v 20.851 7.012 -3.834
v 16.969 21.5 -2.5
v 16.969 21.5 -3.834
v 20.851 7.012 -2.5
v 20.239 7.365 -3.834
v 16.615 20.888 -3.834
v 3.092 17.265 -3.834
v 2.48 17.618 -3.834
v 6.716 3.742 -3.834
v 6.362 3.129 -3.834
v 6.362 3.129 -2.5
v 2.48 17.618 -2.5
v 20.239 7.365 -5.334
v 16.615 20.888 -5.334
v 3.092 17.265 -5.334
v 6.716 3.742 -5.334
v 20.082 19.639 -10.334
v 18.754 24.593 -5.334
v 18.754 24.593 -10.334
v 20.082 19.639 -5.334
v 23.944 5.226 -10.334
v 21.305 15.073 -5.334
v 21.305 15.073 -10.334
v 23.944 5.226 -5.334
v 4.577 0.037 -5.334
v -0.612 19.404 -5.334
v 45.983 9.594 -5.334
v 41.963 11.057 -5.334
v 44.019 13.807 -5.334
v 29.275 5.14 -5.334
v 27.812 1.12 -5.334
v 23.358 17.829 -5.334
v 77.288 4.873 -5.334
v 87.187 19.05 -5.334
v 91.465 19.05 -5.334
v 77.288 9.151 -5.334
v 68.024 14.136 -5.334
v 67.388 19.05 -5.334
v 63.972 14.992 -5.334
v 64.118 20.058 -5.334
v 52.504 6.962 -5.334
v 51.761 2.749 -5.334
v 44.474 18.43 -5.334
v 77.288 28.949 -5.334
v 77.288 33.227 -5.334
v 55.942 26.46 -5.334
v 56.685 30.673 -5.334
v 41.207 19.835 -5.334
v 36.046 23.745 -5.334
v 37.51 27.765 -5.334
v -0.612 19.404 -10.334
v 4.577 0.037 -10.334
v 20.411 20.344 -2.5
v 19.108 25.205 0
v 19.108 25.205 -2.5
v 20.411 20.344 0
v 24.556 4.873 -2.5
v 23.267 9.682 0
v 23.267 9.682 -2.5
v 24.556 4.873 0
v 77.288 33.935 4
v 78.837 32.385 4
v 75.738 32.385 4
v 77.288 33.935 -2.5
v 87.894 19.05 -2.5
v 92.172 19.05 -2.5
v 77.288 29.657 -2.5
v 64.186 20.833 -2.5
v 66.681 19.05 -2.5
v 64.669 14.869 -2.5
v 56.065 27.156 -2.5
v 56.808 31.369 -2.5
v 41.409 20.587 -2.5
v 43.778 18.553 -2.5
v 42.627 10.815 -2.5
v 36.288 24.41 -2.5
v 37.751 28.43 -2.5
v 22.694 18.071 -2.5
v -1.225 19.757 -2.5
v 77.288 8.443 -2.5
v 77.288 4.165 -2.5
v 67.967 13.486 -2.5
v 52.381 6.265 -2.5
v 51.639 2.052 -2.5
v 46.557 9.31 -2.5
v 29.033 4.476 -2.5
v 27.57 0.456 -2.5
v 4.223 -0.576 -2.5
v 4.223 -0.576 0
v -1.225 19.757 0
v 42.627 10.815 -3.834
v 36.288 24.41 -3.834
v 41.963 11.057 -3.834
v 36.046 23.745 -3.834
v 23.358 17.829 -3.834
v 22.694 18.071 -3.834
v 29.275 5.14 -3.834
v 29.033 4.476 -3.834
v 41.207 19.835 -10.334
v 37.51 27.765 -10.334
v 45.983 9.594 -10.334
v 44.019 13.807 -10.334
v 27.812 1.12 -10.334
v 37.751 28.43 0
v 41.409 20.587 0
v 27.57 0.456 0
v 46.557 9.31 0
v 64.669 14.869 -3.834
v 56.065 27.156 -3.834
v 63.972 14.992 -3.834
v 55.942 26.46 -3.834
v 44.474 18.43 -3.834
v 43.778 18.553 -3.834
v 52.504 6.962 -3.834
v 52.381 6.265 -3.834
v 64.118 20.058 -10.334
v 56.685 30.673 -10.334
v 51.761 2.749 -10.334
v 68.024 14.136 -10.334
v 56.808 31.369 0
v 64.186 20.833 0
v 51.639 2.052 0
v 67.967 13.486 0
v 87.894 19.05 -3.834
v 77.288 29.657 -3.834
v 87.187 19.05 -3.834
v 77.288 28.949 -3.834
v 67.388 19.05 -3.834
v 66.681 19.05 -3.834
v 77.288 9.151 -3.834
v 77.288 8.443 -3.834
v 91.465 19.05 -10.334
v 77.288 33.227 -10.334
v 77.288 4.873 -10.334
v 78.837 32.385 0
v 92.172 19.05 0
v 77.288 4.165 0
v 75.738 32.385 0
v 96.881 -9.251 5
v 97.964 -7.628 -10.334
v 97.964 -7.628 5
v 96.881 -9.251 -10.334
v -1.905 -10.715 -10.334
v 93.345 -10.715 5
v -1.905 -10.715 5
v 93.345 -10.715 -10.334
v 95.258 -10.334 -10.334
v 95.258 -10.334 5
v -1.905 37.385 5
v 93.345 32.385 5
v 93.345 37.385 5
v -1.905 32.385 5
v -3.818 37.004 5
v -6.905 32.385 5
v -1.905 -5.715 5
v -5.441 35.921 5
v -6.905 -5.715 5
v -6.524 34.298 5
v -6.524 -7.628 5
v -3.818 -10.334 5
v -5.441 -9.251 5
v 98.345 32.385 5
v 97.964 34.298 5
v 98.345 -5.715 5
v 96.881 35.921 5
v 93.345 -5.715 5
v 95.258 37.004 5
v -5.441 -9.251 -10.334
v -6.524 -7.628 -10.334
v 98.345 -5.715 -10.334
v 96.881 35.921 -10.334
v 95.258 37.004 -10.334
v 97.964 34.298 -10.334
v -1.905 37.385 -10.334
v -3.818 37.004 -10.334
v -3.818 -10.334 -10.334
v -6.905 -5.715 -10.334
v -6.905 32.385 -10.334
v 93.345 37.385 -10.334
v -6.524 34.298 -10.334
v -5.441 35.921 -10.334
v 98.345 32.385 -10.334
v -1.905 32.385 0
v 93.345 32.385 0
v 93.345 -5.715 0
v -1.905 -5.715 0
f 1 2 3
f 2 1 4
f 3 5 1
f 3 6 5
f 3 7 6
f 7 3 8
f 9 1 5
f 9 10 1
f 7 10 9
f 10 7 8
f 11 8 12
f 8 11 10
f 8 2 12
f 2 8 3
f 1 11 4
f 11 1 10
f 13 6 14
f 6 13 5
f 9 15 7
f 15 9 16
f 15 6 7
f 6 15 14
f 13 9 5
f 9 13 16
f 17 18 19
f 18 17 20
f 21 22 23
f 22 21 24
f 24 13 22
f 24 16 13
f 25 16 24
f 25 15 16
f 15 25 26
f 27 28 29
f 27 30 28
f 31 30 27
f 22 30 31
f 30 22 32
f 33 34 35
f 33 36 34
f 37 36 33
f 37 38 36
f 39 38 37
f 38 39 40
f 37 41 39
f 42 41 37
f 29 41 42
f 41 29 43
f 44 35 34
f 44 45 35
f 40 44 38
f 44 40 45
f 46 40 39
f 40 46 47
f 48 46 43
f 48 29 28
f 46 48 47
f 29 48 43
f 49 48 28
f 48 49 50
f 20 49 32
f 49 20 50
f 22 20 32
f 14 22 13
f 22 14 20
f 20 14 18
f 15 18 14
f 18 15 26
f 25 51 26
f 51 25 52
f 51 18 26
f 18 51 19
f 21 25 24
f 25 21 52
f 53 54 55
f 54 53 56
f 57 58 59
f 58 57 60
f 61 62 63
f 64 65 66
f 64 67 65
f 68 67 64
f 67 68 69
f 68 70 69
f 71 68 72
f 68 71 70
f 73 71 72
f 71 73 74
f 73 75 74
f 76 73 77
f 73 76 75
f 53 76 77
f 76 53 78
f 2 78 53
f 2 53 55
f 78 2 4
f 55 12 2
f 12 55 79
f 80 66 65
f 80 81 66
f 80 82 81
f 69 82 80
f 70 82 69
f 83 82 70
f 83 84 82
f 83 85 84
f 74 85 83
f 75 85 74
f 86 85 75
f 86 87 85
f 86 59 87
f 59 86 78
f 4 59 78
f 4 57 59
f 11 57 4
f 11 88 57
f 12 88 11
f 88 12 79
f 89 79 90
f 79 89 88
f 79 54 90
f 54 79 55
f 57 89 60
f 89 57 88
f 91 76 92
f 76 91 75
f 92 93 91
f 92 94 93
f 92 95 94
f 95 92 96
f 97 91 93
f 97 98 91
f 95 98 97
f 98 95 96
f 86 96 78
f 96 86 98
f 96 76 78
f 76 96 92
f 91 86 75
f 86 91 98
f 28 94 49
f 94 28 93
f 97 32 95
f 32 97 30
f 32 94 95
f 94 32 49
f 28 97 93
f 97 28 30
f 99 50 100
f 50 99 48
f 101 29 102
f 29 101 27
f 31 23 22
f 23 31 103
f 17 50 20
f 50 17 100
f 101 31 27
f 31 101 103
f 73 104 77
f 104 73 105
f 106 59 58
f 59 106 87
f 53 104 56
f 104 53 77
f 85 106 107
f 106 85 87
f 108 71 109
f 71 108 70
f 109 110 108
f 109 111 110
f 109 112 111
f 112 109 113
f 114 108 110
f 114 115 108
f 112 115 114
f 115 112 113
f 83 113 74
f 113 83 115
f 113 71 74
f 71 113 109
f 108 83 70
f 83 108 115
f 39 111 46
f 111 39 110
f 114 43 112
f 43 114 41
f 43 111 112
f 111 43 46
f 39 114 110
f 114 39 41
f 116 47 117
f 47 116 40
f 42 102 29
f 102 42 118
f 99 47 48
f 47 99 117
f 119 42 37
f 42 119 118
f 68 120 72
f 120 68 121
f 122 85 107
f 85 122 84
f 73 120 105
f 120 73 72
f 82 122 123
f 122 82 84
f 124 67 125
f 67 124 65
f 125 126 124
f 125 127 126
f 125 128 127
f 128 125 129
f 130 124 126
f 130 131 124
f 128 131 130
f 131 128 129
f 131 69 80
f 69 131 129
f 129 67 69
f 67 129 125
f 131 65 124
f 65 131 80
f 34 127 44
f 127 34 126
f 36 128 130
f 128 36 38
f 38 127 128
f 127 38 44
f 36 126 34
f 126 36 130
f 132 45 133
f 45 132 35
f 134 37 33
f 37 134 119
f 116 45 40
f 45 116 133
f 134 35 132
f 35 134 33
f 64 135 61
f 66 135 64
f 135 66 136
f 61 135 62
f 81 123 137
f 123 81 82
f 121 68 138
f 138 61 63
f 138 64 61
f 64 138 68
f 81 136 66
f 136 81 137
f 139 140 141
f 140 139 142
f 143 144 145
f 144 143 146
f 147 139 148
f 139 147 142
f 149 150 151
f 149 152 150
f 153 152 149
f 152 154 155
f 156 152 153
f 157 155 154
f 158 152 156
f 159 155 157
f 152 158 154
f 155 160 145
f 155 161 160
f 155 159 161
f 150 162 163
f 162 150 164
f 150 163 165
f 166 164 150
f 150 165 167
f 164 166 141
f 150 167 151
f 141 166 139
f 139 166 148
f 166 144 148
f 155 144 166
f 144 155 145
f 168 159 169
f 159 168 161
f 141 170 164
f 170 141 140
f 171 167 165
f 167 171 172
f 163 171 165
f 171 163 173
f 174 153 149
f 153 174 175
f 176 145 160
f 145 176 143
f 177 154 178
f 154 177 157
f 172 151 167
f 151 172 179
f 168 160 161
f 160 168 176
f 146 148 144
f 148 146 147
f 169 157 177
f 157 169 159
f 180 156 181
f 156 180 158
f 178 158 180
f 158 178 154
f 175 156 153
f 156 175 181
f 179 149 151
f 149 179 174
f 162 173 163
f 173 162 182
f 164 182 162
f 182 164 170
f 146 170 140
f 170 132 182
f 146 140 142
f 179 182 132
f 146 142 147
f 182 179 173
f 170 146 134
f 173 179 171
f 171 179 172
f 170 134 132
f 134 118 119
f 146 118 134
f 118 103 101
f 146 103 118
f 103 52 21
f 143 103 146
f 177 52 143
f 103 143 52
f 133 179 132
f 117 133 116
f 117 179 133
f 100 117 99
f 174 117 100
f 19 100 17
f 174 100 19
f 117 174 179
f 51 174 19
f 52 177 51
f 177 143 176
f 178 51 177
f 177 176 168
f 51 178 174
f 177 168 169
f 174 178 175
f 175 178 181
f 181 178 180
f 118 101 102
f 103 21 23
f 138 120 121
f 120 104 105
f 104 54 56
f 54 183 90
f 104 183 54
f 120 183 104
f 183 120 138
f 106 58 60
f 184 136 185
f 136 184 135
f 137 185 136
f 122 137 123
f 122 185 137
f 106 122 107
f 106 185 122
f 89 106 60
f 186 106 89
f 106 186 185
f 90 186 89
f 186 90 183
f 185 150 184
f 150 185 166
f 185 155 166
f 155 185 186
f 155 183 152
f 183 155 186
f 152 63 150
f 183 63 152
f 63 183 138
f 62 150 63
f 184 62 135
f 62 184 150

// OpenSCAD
// file: ../lib/circuits/helpers.scad
function bu(u) = u * 2.54;

module breadboard_row(number, orientation="vertical") {
  children();
  if(number > 1) {
    if(orientation == "vertical") {
      translate([0,bu(1),0])
        breadboard_row(number-1, orientation=orientation) {
          children();
        }
    } else {
      translate([bu(1),0,0])
        breadboard_row(number-1, orientation=orientation){
          children();
        }
    }
  }
}
// file: ../lib/switches/rgb.scad
include <../variables.scad>

module rgb_row_trace_connection(width, height, xpos, ypos, rgb, connections) {
  half_width = u_mm(width)/2;
  half_height = u_mm(height)/2;
  if(connections[3] == "connect") {
    translate([1-half_width,8.875,0]){
      circle(d=0.8,$fn=40);
      offset(0.4)
        polygon(points=[[0,-0.01],[0,0.01],[u_mm(-xpos)-2, u_mm(-ypos)+0.01],[u_mm(-xpos)-2, u_mm(-ypos)-0.01]]);
    }
    translate([1-half_width,4.9,0]){
      circle(d=0.8,$fn=40);
      offset(0.4)
        polygon(points=[[0,-0.01],[0,0.01],[u_mm(-xpos)-2, u_mm(-ypos)+0.01],[u_mm(-xpos)-2, u_mm(-ypos)-0.01]]);
    }
    translate([1-half_width,3.3,0]){
      circle(d=0.8,$fn=40);
      offset(0.4)
        polygon(points=[[0,-0.01],[0,0.01],[u_mm(-xpos)-2, u_mm(-ypos)+0.01],[u_mm(-xpos)-2, u_mm(-ypos)-0.01]]);
    }
  }
  if(connections[2] == "connect") {
    translate([half_width-1,8.875,0]) {
      circle(d=0.8,$fn=40);
    }
    translate([half_width-1,4.9,0]) {
      circle(d=0.8,$fn=40);
    }
    translate([half_width-1,3.3,0]){
      circle(d=0.8,$fn=40);
    }
  }
}

module rgb_pcb_drill(width=1, height=1, rgb=true, connections=["hole","hole","hole","hole"]) {
  half_width = u_mm(width)/2;
  half_height = u_mm(height)/2;
  translate([half_width,half_height,0]) {
    if(rgb == true) {
      // LED Hole
      translate([-1.875,3.4])
        square([3.75,3]);

      // LED D
      if(connections[3] == "hole")
        translate([1.3-half_width,8,0])
          circle(d=1,$fn=40);
      if(connections[2] == "hole")
        translate([half_width-1.3,8,0])
          circle(d=1,$fn=40);

      // LED G
      if(connections[3] == "hole")
        translate([1.3-half_width,5.4,0])
          circle(d=1,$fn=40);
      if(connections[2] == "hole")
        translate([half_width-1.3,5.4,0])
          circle(d=1,$fn=40);

      // LED V
      if(connections[3] == "hole")
        translate([1.3-half_width,2.8,0])
          circle(d=1,$fn=40);
      if(connections[2] == "hole")
        translate([half_width-1.3,2.8,0])
          circle(d=1,$fn=40);
    }

    children();
  }
}

module rgb_pcb_hole_traces(width=1, height=1, rgb=true, xpos=0, ypos=0, connections=["hole","hole","hole","hole"]) {
  half_width = u_mm(width)/2;
  half_height = u_mm(height)/2;
  translate([half_width,half_height,0]) {
    if(rgb == true) {
      // LED D
      if(connections[3] == "hole")
        translate([1.3-half_width,8,0])
          circle(d=2.5,$fn=40);
      if(connections[2] == "hole")
        translate([half_width-1.3,8,0])
          circle(d=2.5,$fn=40);

      // LED G
      if(connections[3] == "hole")
        translate([1.3-half_width,5.4,0])
          circle(d=2.5,$fn=40);
      if(connections[2] == "hole")
        translate([half_width-1.3,5.4,0])
          circle(d=2.5,$fn=40);

      // LED V
      if(connections[3] == "hole")
        translate([1.3-half_width,2.8,0])
          circle(d=2.5,$fn=40);
      if(connections[2] == "hole")
        translate([half_width-1.3,2.8,0])
          circle(d=2.5,$fn=40);
    }

    children();
  }
}

module rgb_pcb_traces(width=1, height=1, rgb=true, xpos=0, ypos=0, connections=["hole","hole","hole","hole"]) {
  half_width = u_mm(width)/2;
  half_height = u_mm(height)/2;
  rgb_pcb_hole_traces(width=width, height=height, rgb=rgb, connections=connections) {
    if(rgb == true) {
      rgb_row_trace_connection(width=width, height=height, xpos=xpos, ypos=ypos, rgb=rgb, connections=connections);
      v_left = connections[3] == "none" ? 1 : half_width-5;
      // LED G
      translate([1.25,5])
        square([2,2]);
      translate([2.7,8.5,0]) {
        length = connections[2] == "none" ? 2 : half_width-3.7; 
        square([length,0.75]);
      }
      translate([2.7,6.8])
        square([0.8,2.4]);
      translate([-3.5,6.2])
        square([7,0.8]);
      translate([-3.5,6.8])
        square([0.8,2.4]);
      translate([-4-v_left,8.5,0])
        square([v_left+1,0.75]);

      // LED D
      translate([-4-v_left,4.5,0])
        square([v_left,0.8]);
      translate([-4.5,4.5,0])
        square([0.8,1.3]);
      translate([-4.5,5,0])
        square([1.3,0.8]);
      translate([2,4,0])
        square([2,0.8]);
      translate([4,4,0])
        square([0.8,1.3]);
      translate([4,4.5,0]) {
        length = connections[2] == "none" ? 0 : half_width-5; 
        square([length,0.75]);
      }
      translate([-3.375,5])
        square([2,1.1]);
      translate([1.25,3.75])
        square([2,1.1]);

      // LED V
      v_right = connections[2] == "none" ? 0 : half_width-5.25;
      translate([-4-v_left,2.9,0])
        square([v_right+v_left+8.875,0.8]);
      translate([-3.375,3.5])
        square([2,1.35]);
    }

    children();
  }
}
// file: ../lib/switches/base.scad
include <../variables.scad>
include <rgb.scad>

// ["top", "bottom", "left", "right"]

module switch_row_trace_connection(width, height, xpos, ypos, rgb, connections) {
  half_width = u_mm(width)/2;
  half_height = u_mm(height)/2;
  if(connections[3] == "connect") {
    translate([1-half_width,-5.5,0]){
      circle(d=0.8,$fn=40);
      offset(0.4)
        polygon(points=[[0,-0.01],[0,0.01],[u_mm(-xpos)-2, u_mm(-ypos)+0.01],[u_mm(-xpos)-2, u_mm(-ypos)-0.01]]);
    }
  }
  if(connections[2] == "connect") {
    translate([half_width-1,-5.5,0]) {
      circle(d=0.8,$fn=40);
    }
  }
}

module switch_column_trace_connection(width, height, xpos, ypos, rgb, connections, last_xpos=0, last_ypos=0) {
  half_width = u_mm(width)/2;
  half_height = u_mm(height)/2;
  if(connections[1] == "connect") {
    translate([-u_mm((width-1)/2)-0.9,half_height-1,0]) {
      circle(d=0.8,$fn=40);
      offset(0.4)
        polygon(points=[[0,-0.01],[0,0.01],[u_mm((width-1)/2),0.01],[u_mm((width-1)/2),-0.01]]);
    }
  }
  if(connections[0] == "connect") {
    y_off = u_mm(ypos-last_ypos);
    x_off = u_mm(last_xpos-xpos);
    translate([-0.875,-1-y_off-half_height,0]) {
      offset(0.4)
        polygon(points=[[-0.01+x_off,0],[0.01+x_off,0],[0.01,2+y_off],[-0.01,2+y_off]]);
      translate([x_off-0.01,0]) {
        offset(0.4)
          polygon(points=[[0,-0.01],[0,0.01],[u_mm((width-1)/2)+1,0.01],[u_mm((width-1)/2)+1,-0.01]]);
      }
    }
  }
}

module switch_base_pcb_drill(width=1, height=1, rgb=true, single=true, connections=["hole","hole","hole","hole"]) {
  half_width = u_mm(width)/2;
  half_height = u_mm(height)/2;
  rgb_pcb_drill(width=width, height=height, rgb=rgb, connections=connections) {
    // Row
    if(connections[2] == "hole")
      translate([half_width-1.3,-5.5,0])
        circle(d=1,$fn=40);
    if(connections[3] == "hole")
      translate([1.3-half_width,-5.5,0])
        circle(d=1,$fn=40);

    // Column
    if(connections[1] == "hole")
      translate([-1,half_height-1.25,0])
        circle(d=1,$fn=40);
    if(connections[0] == "hole")
      translate([-1,1.25-half_height,0])
        circle(d=1,$fn=40);

    children();
  }
}

module switch_base_pcb_traces(width=1, height=1, rgb=true, xpos=0, ypos=0, connections=["hole","hole","hole","hole"], last_xpos=0, last_ypos=0, single=true) {
  half_width = u_mm(width)/2;
  half_height = u_mm(height)/2;
  rgb_pcb_traces(width=width, height=height, rgb=rgb, xpos=xpos, ypos=ypos, connections=connections) {
    switch_row_trace_connection(width, height, xpos, ypos, rgb, connections);
    if(single && !rgb)
      switch_column_trace_connection(width, height, xpos, ypos, rgb, connections, last_xpos=last_xpos, last_ypos=last_ypos);

    // Row
    if(connections[2] == "hole")
      translate([half_width-1.3,-5.5,0])
        circle(d=2.5,$fn=40);
    if(connections[3] == "hole")
      translate([1.3-half_width,-5.5,0])
        circle(d=2.5,$fn=40);

    // Column
    if(connections[1] == "hole")
      translate([-1,half_height-1.25,0])
        circle(d=2.4,$fn=40);
    if(connections[0] == "hole")
      translate([-1,1.25-half_height,0])
        circle(d=2.4,$fn=40);

    children();
  }
}

module switch_base_pcb_traces_bottom(width=1, height=1, rgb=true, xpos=0, ypos=0, connections=["hole","hole","hole","hole"], last_xpos=0, last_ypos=0) {
  half_width = u_mm(width)/2;
  half_height = u_mm(height)/2;
  rgb_pcb_hole_traces(width=width, height=height, rgb=rgb, connections=connections) {
    switch_column_trace_connection(width, height, xpos, ypos, rgb, connections, last_xpos=last_xpos, last_ypos=last_ypos);

    // Row
    if(connections[2] == "hole")
      translate([half_width-1.3,-5.5,0])
        circle(d=2.5,$fn=40);
    if(connections[3] == "hole")
      translate([1.3-half_width,-5.5,0])
        circle(d=2.5,$fn=40);

    // Column
    if(connections[1] == "hole")
      translate([-1,half_height-1.25,0])
        circle(d=2.5,$fn=40);
    if(connections[0] == "hole")
      translate([-1,1.25-half_height,0])
        circle(d=2.5,$fn=40);

    children();
  }
}
// file: ../lib/switches/footprints.scad
include <../variables.scad>
include <stabilizers.scad>

module pcb_switch_outline(width=1, height=1) {
  stab_extra = width >= 2 ? 2 : 0;
  translate([0,-stab_extra])
    square([u_mm(width)+0.01, u_mm(height)+0.01+stab_extra]);
}

module pcb_switch_space_outline(width=1, height=1, style="mx", cnc=false) {
  offset = height_for_style(style);
  stab_extra = width >= 2 ? 2 : 0;
  translate([-1,-1-stab_extra,2.834-offset])
    cube([u_mm(width) + 2, u_mm(height) + 2 + stab_extra, 1.166+offset]);
  translate([u_mm(width/2),u_mm(height/2)]) {
    translate([-7.5,-7.5,1.5-offset])
      cube([15,15,5]);
    translate([-7,-7,-10])
      cube([14,14,10]);
    translate([u_mm(-width/2)-0.5,u_mm(-height/2)-0.5,-20-offset])
      cube([u_mm(width)+1,u_mm(height)+1, 20]);
  }
  translate([hole_offset(width), hole_offset(height),-10])
    stab(width);
}
// file: ../lib/switches/stabilizers.scad
module stab_hole_render(distance){
  translate([14+distance+3.375,6.99,0]) {
    circle(d=3.175, $fn=40);
    translate([0,-15.24,0])
      circle(d=4.064, $fn=40);
  }
  translate([-6.75-distance+3.375,6.99,0]) {
    circle(d=3.175, $fn=40);
    translate([0,-15.24,0])
      circle(d=4.064, $fn=40);
  }
}

module stab_holes(width) {
  if (width >= 7) {
    stab_hole_render(39.6);
  } else if (width >= 6) {
    stab_hole_render(39.6);
  } else if(width >= 2) {
    stab_hole_render(1.6);
  }
}

module stab_render(distance, cnc=false, height=5.334) {
  translate([14+distance,1.47,0]){
    // Right Side Large Hole
    cube([6.75,12.3,10]);

    // Add 1/16" corner holes for milling
    if(cnc){
      translate([0.56,0.56,0])
        cylinder(h=10,d=1.59,$fn=20);
      translate([6.75-0.56,0.56,0])
        cylinder(h=10,d=1.59,$fn=20);
      translate([0.56,12.3-0.56,0])
        cylinder(h=10,d=1.59,$fn=20);
      translate([6.75-0.56,12.3-0.56,0])
        cylinder(h=10,d=1.59,$fn=20);
    }
    translate([5.75,3.23,0]){
      // Side hole for notch
      cube([1.825,3.175,10]);
      translate([1.825,1.59,0])
        if(cnc)
          resize([1.59,3.175,10])
            cylinder(h=10,d=1.59,$fn=20);
    }
    translate([1.725,11.3,0]){
      // Top Notch
      cube([3.3,2.2,10]);
      if(cnc)
        translate([1.65,2.2,0])
          resize([3.3,1,10])
            cylinder(h=10,d=1,$fn=20);
    }
    // Thin out for clip
    translate([-1,-1,10-height+1.5])
      cube([8.75,14.3,height-1.5]);
  }
  translate([-6.75-distance,1.47,0]){
    // Left Side Large Hole
    cube([6.75,12.3,10]);
    translate([-0.825,3.23,0]){
      // Side hole for notch
      cube([1.825,3.175,10]);
      if(cnc)
        translate([0,1.59,0])
          resize([1.59,3.175,10])
            cylinder(h=10,d=1.59,$fn=20);

    }
    translate([1.725,11.3,0]){
      // Top Notch
      cube([3.3,2.2,10]);
      if(cnc)
        translate([1.65,2.2,0])
          resize([3.3,1,10])
            cylinder(h=10,d=1,$fn=20);
    }
    if(cnc){
      translate([0.56,0.56,0])
        cylinder(h=10,d=1.59,$fn=20);
      translate([6.75-0.56,0.56,0])
        cylinder(h=10,d=1.59,$fn=20);
      translate([0.56,12.3-0.56,0])
        cylinder(h=10,d=1.59,$fn=20);
      translate([6.75-0.56,12.3-0.56,0])
        cylinder(h=10,d=1.59,$fn=20);
    }
    // Thin out for clip
    translate([-1,-1,10-height+1.5])
      cube([8.75,14.3,height-1.5]);
  }
  // Center shaft for bar
  translate([-distance-2,4.7,0]){
    cube([distance*2+20,4.6,10]);
  }
}

module stab(key_width, cnc=false) {
  if (key_width >= 7) {
    stab_render(39.6, cnc=cnc);
  } else if (key_width >= 6) {
    stab_render(39.6, cnc=cnc);
  } else if(key_width >= 2) {
    stab_render(1.6, cnc=cnc);
  }
}
// file: ../lib/circuits/wire.scad
module guage(guage=12) {
  fn=20;
  if(guage == 8) {
    circle(d=3.25, $fn=fn);
  } else if (guage == 10) {
    circle(d=2.59, $fn=fn);
  } else if (guage == 12) {
    circle(d=2.06, $fn=fn);
  } else if (guage == 14) {
    circle(d=1.57, $fn=fn);
  } else if (guage == 16) {
    circle(d=1.3, $fn=fn);
  }
}

module wire_pcb_drill(guage=12) {
  offset(0.1)
    guage(guage);
}

module wire_pcb_traces(guage=12) {
  offset(0.75)
    guage(guage);
}

module wire_pcb_outline(guage=12) {
  offset(1.5)
    guage(guage);
}

module wire_space_outline(guage=12) {
  linear_extrude(10)
    offset(0.1)
      guage(guage);
}
// file: ../lib/circuits/trrs.scad
module trrs_post(d=1.2) {
  translate([0,-d/4,0]) {
    circle(d=d, $fn=20);
    translate([-d/2,0,0]) {
      square([d,(d/2-.2)]);
    }
    translate([0,(d/2-.2),0]) {
      circle(d=d, $fn=20);
    }
  }
}

module trrs_pcb_drill(side="left") {
  translate([2.8,1.5]) {
    circle(d=2, $fn=20);
  }
  translate([2.8,8.5]) {
    circle(d=2, $fn=20);
  }
  translate([0.5,11.3,0]) {
    trrs_post();
  }
  translate([5.1,3.2,0]) {
    trrs_post();
  }
  translate([5.1,6.2,0]) {
    trrs_post();
  }
  translate([5.1,10.2,0]) {
    trrs_post();
  }
  if(side != "none"){
    offset = side == "left" ? 7.6 : -2;
    translate([offset,11.3]) {
      circle(d=1.2, $fn=20);
    }
    translate([offset,8.3]) {
      circle(d=1.2, $fn=20);
    }
    translate([offset,5.3]) {
      circle(d=1.2, $fn=20);
    }
    translate([offset,2.2]) {
      circle(d=1.2, $fn=20);
    }
  }
}

module trrs_pcb_traces(side="left") {
  translate([-1,9.7,0]){
    difference() {
      square([3,3]);
      if(side == "right") {
        translate([3,-1.8]) {
          rotate(45) {
            square(2);
          }
        }
      }
    }
  }
  translate([3.6,1.2,0]){
    difference() {
      square([3,3.5]);
      if(side == "left") {
        translate([3,2.3]) {
          rotate(45) {
            square(2);
          }
        }
      }
    }
  }
  translate([3.6,4.8,0]){
    difference() {
        square([3,3.5]);
        if(side == "left") {
          translate([3,2.3]) {
            rotate(45) {
              square(2);
            }
          }
        }
    }
  }
  translate([3.6,8.4,0]){
    difference() {
      square([3,3.2]);
      if(side == "left") {
        translate([3,1.8]) {
          rotate(45) {
            square(2);
          }
        }
      }
    }
  }
  if(side != "none"){
    translate([side == "left" ? 7.6 : -2,0,0]){
      translate([0,11.3]) {
        circle(d=3, $fn=20);
      }
      translate([0,8.3]) {
        circle(d=2.9, $fn=20);
      }
      translate([0,5.3]) {
        circle(d=3, $fn=20);
      }
      translate([0,2.2]) {
        circle(d=3, $fn=20);
      }
    }
    translate([side == "left" ? 5.6 : -2,0,0]){
      left_trace = side == "left" ? 2.5 : 7.6;
      translate([0,2.2]) {
        square([left_trace,1.5]);
      }
      translate([0,5.1]) {
        square([left_trace,1.5]);
      }
      if(side == "left") {
        translate([0,8.7]) {
          square([left_trace,0.9]);
        }
      }
      else {
        translate([0,8]) {
          square([4,1.6]);
        }
        translate([4,9]) {
          square([4,1.6]);
        }
        translate([2.8,9.4]) {
          rotate(-45) {
            square([1,1.7]);
          }
        }
      }
    }
    translate([side == "left" ? 0.5 : -2,0,0]){
      right_trace = side == "left" ? 7.1 : 2;
      translate([0,11.7]) {
        square([right_trace,1.3]);
      }
      translate([0,12]) {
        circle(1, $fn=20);
      }
      translate([right_trace,11.8]) {
        circle(1, $fn=20);
      }
    }
  }
}

module trrs_pcb_outline(side="left") {
  translate([-1,0,0]) {
    square([7.6,13.1]);
  }
  if(side != "none"){
    translate([side == "left" ? 5.6 : -3.5, 0]) {
      square([4,13.1]);
    }
  }
}

module trrs_space_outline(side="left") {
  translate([0,0,-5.3]) {
    linear_extrude(7){
      translate([-2,-1,0])
        square([9.6,15.1]);
      translate([0,-12.1,0])
        square([5.6,12.1]);
      if(side != "none")
        translate([side == "left" ? 5.6 : -4.5, -1])
          square([5,15.1]);
    }
  }
  translate([3,-2,-2.6]) {
    rotate([90,0,0]) {
      cylinder(d=10, h=30, $fn=100);
    }
  }
}
// file: ../lib/circuits/trace.scad
function vdef(vector, index) = len(vector) == index ? vector[index-1] : vector[index];
function vadd(vector, index, axis) = vdef(vector, index)[axis] > vdef(vector, index-1)[axis] ? 0.01 : -0.01;
function polygon_from_vector(vector) = 
  len(vector) > 0 ?
    concat(vector, 
      [for (i = [1:len(vector)]) 
        [vector[len(vector)-i][0]-vadd(vector, i, 0),vector[len(vector)-i][1]-vadd(vector, i, 1)]])
      : [];

function parse_loc(loc) = [
  loc[5],
  len(loc) < 7 ? "both" : loc[6],
  len(loc) < 8 ? "none" : loc[7],
];

module manual_trace_pcb_drill(location) {
  vector = parse_loc(location)[0];
  echo("holes", parse_loc(location)[2]);
  if(parse_loc(location)[2] == "holes" || parse_loc(location)[2] == "hole_begin") {
    translate(vector[0]) {
      circle(d=1, $fn=20);
    }
  }
  if(parse_loc(location)[2] == "holes" || parse_loc(location)[2] == "hole_end") {
    translate(vector[len(vector)-1]) {
      circle(d=1, $fn=20);
    }
  }
}

module manual_trace_pcb_traces(location) {
  vector = parse_loc(location)[0];
  if(parse_loc(location)[1] != "bottom") {
    offset(0.4) {
      polygon(points=polygon_from_vector(vector));
    }
  }
  if(parse_loc(location)[2] == "holes" || parse_loc(location)[2] == "hole_begin") {
    translate(vector[0]) {
      circle(d=2.5, $fn=20);
    }
  }
  if(parse_loc(location)[2] == "holes" || parse_loc(location)[2] == "hole_end") {
    translate(vector[len(vector)-1]) {
      circle(d=2.5, $fn=20);
    }
  }
}

module manual_trace_pcb_traces_bottom(location) {
  vector = parse_loc(location)[0];
  if(parse_loc(location)[1] != "top") {
    offset(0.4) {
      polygon(points=polygon_from_vector(vector));
    }
  }
  if(parse_loc(location)[2] == "holes" || parse_loc(location)[2] == "hole_begin") {
    translate(vector[0]) {
      circle(d=2.5, $fn=20);
    }
  }
  if(parse_loc(location)[2] == "holes" || parse_loc(location)[2] == "hole_end") {
    translate(vector[len(vector)-1]) {
      circle(d=2.5, $fn=20);
    }
  }
}

module manual_trace_pcb_outline(location) {
  vector = parse_loc(location)[0];
  echo("location", location);
  offset(1)
    polygon(points=polygon_from_vector(vector));

  if(parse_loc(location)[2] == "holes" || parse_loc(location)[2] == "hole_begin") {
    translate(vector[0]) {
      circle(d=4, $fn=20);
    }
  }
  if(parse_loc(location)[2] == "holes" || parse_loc(location)[2] == "hole_end") {
    translate(vector[len(vector)-1]) {
      circle(d=4, $fn=20);
    }
  }
}

module manual_trace_space_outline(location) {
  vector = parse_loc(location)[0];
  translate([0,0,-1])
    linear_extrude(2)
      offset(0.5)
        manual_trace_pcb_outline(vector);
}
// file: ../lib/circuits/support.scad
module support_pcb_drill(mm=2) {
  offset(0.1)
    circle(d=mm, $fn=20);
}

module support_pcb_traces(mm=2) {
}

module support_pcb_outline(mm=2) {
  offset(2)
    circle(d=mm, $fn=20);
}

module support_space_outline(mm=2) {
  linear_extrude(10)
    offset(0.1)
      circle(d=mm, $fn=20);
}
// file: ../lib/circuits/proton_c.scad
use <helpers.scad>

module proton_c_pcb_drill(size="full") {
  translate([bu(0.5),bu(1.5),0]) {
    translate([0,bu(1)])
      breadboard_row(4, "horizontal"){
        circle(d=1, $fn=20);
        translate([0,bu(1)])
          circle(d=1, $fn=20);
      }
    translate([bu(4),bu(1)])
      breadboard_row(2)
        circle(d=1, $fn=20);
    translate([bu(4),bu(3)])
      breadboard_row(2)
        circle(d=1, $fn=20);
    circle(d=1, $fn=20);
    translate([bu(1),0,0])
      circle(d=1, $fn=20);
    translate([bu(5),0,0])
      circle(d=1, $fn=20);
    translate([bu(6),0,0])
      circle(d=1, $fn=20);
    breadboard_row(12) {
      circle(d=1, $fn=20);
      translate([bu(1),0,0])
        circle(d=1, $fn=20);
      translate([bu(5),0,0])
        circle(d=1, $fn=20);
      translate([bu(6),0,0])
        circle(d=1, $fn=20);
    }
    if(size == "full")
      translate([0,bu(13)])
        breadboard_row(6) {
          circle(d=1, $fn=20);
          translate([bu(1),0,0])
            circle(d=1, $fn=20);
          translate([bu(5),0,0])
            circle(d=1, $fn=20);
          translate([bu(6),0,0])
            circle(d=1, $fn=20);
    }
  }
}

module proton_c_pcb_traces(size="full") {
  translate([bu(0.5),bu(1.5),0]) {
    translate([0,bu(1)])
      breadboard_row(4, "horizontal"){
        circle(d=2.4, $fn=20);
        translate([-1,0])
          square([2,bu(1)]);
        translate([0,bu(1)])
          circle(d=2.4, $fn=20);
      }
    translate([0,bu(1)])
      breadboard_row(2) {
        translate([bu(5),0])
          circle(d=2.4, $fn=20);
        translate([bu(5),-1,0])
          square([bu(1),2]);
        translate([bu(6),0,0])
          circle(d=2.4, $fn=20);
      }
    translate([bu(4),bu(1)]){
      translate([-0.75,-1])
        square([1.5,bu(2)-2]);
      breadboard_row(2)
        circle(d=2.4, $fn=20);
      translate([0,-0.75])
        square([bu(2),1.5]);
    }
    translate([bu(4),bu(3)]){
      translate([-0.75,-1])
        square([1.5,bu(2)-2]);
      breadboard_row(2)
        circle(d=2.4, $fn=20);
      translate([0,-0.75])
        square([bu(2),1.5]);
    }
    circle(d=2.4, $fn=20);
    translate([0,-1,0])
      square([bu(1),2]);
    translate([bu(1),0,0])
      circle(d=2.4, $fn=20);
    translate([bu(5),0])
      circle(d=2.4, $fn=20);
    translate([bu(5),-1,0])
      square([bu(1),2]);
    translate([bu(6),0,0])
      circle(d=2.4, $fn=20);
    translate([0,bu(3)])
      breadboard_row(9) {
        circle(d=2.4, $fn=20);
        translate([0,-1,0])
          square([bu(1),2]);
        translate([bu(1),0,0])
          circle(d=2.4, $fn=20);
        translate([bu(5),0])
          circle(d=2.4, $fn=20);
        translate([bu(5),-1,0])
          square([bu(1),2]);
        translate([bu(6),0,0])
          circle(d=2.4, $fn=20);
      }
    if(size == "full")
      translate([0,bu(13)])
        breadboard_row(6) {
          circle(d=2.4, $fn=20);
          translate([0,-1,0])
            square([bu(1),2]);
          translate([bu(1),0,0])
            circle(d=2.4, $fn=20);
          translate([bu(5),0])
            circle(d=2.4, $fn=20);
          translate([bu(5),-1,0])
            square([bu(1),2]);
          translate([bu(6),0,0])
            circle(d=2.4, $fn=20);
        }
  }
}

module proton_c_pcb_outline(size="full") {
  translate([0,bu(1)])
  square([bu(7), bu(size == "full" ? 19 : 12)]);
}

module proton_c_space_outline(size="full") {
  translate([0,0,-4]) {
    linear_extrude(6) {
      translate([-bu(0.5),-bu(0.5)])
        square([bu(8), bu(size == "full" ? 21 : 14)]);
    }
    linear_extrude(5) {
      translate([bu(0.5),-bu(15),0])
        square([bu(6),bu(25)]);
    }
  }
}
// file: ../lib/circuits/pro_micro.scad
use <helpers.scad>

module pro_micro_pcb_drill(connections="holes") {
  translate([bu(0.5),bu(1.5),0]) {
    if(connections == "holes"){
      translate([bu(3),bu(1)])
        breadboard_row(3)
          circle(d=1, $fn=20);
      translate([bu(4),bu(3)])
        breadboard_row(3)
          circle(d=1, $fn=20);
    }
    breadboard_row(12) {
      circle(d=1, $fn=20);
      if(connections == "holes") {
        translate([bu(1),0,0])
          circle(d=1, $fn=20);
        translate([bu(5),0,0])
          circle(d=1, $fn=20);
      }
      translate([bu(6),0,0])
        circle(d=1, $fn=20);
    }
  }
}

module pro_micro_pcb_traces(connections="holes") {
  translate([bu(0.5),bu(1.5),0]) {
    // GRND
    if(connections == "holes"){
      translate([bu(3),bu(1)]){
        translate([-0.75,-1])
          square([1.5,bu(3)-2]);
        breadboard_row(3)
          circle(d=2.4, $fn=20);
        translate([0,-0.75])
          square([bu(2),1.5]);
      }
      translate([bu(4),bu(3)]){
        translate([-0.75,-1])
          square([1.5,bu(3)-2]);
        breadboard_row(3)
          circle(d=2.4, $fn=20);
        translate([0,-0.75])
          square([bu(2),1.5]);
      }
    }
    breadboard_row(12) {
      circle(d=2.4, $fn=20);
      if(connections == "holes") {
        translate([0,-1,0])
          square([bu(1),2]);
        translate([bu(1),0,0])
          circle(d=2.4, $fn=20);
        translate([bu(5),0])  
          circle(d=2.4, $fn=20);
        translate([bu(5),-1,0])
          square([bu(1),2]);
      }
      translate([bu(6),0,0])
        circle(d=2.4, $fn=20);
    }
  }
}

module pro_micro_pcb_outline() {
  translate([0,bu(1)])
  square([bu(7), bu(12)]);
}

module pro_micro_space_outline() {
  translate([0,0,-4]) {
    linear_extrude(6) {
      translate([-bu(0.5),-bu(0.5)])
        square([bu(8), bu(14)]);
    }
    linear_extrude(5) {
      translate([bu(0.5),-bu(15),0])
        square([bu(6),bu(25)]);
    }
  }
}
// file: ../lib/circuits/mts_101.scad
use <../variables.scad>
module mts_101_pcb_drill() {
  translate([0,1.25]) {
    translate([2.5,0])
      square([3,1]);
    translate([1.25,0.5])
      circle(d=1,$fn=40);
    translate([6.75,0.5])
      circle(d=1,$fn=40);

    translate([2.5,4.75])
      square([3,1]);
    translate([1.25,5.25])
      circle(d=1,$fn=40);
    translate([6.75,5.25])
      circle(d=1,$fn=40);

    translate([4,10])
      circle(d=1,$fn=40);
    translate([1.25,10])
      circle(d=1,$fn=40);
    translate([6.75,10])
      circle(d=1,$fn=40);
  }
}

module mts_101_pcb_traces() {
  translate([0,1.25]) {
    translate([2,-0.5])
      square([4,2]);
    translate([1.25,0.5])
      circle(d=2,$fn=40);
    translate([6.75,0.5])
      circle(d=2,$fn=40);

    translate([2,4.25])
      square([4,2]);
    translate([1.25,5.25])
      circle(d=2,$fn=40);
    translate([6.75,5.25])
      circle(d=2,$fn=40);

    translate([4,10])
      circle(d=2,$fn=40);
    translate([1.25,9.5])
      square([6,1]);
    translate([1.25,10])
      circle(d=2,$fn=40);
    translate([6.75,10])
      circle(d=2,$fn=40);
  }
}

module mts_101_pcb_outline() {
  square([8,13]);
}

module mts_101_space_outline(, cnc=false) {
  translate([-0.5,-0.5,-10])
    cube([9,14, 14.4]);
  translate([4,6.5,-26]) {
    cylinder(d=6, h=18, $fn=30);
    cylinder(d=12, h=10, $fn=60);
  }
}
// file: ../lib/circuits/ec11.scad
use <../variables.scad>
use <../switches/base.scad>

module 1u_centered() {
  translate([u_mm(0.5),u_mm(0.5)])
    children();
}

module ec11_pcb_drill(single=false, connections=["hole","hole","hole","hole"]) {
  switch_base_pcb_drill(rgb=false, connections=connections) {
    // Key Column
    translate([-3,0,0])
      circle(d=1,$fn=40);

    // Key Row
    translate([7,2.5])
      circle(d=1, $fn=20);

    if(single) {
      translate([4.25,-3,0])
        circle(d=1, $fn=20);
      translate([-3,-3.25,0])
        circle(d=1,$fn=40);
    }
    translate([4.25,0,0])
      circle(d=1, $fn=20);

    translate([7,-2.5])
      circle(d=1, $fn=20);

    if(connections[3] == "hole"){
      translate([-5.5,2.5])
        circle(d=1, $fn=20);
      translate([-5.5,0])
        circle(d=1, $fn=20);
      translate([-5.5,-2.5])
        circle(d=1, $fn=20);
    }
    translate([-7.5,-2.5])
      circle(d=1, $fn=20);
    translate([-7.5,2.5])
      circle(d=1, $fn=20);
    translate([-7.5,0])
      circle(d=1, $fn=20);

    translate([-1.3,-6.25])
      square([2.6,1.5]);
    translate([-1.3,4.75])
      square([2.6,1.5]);
  }
}

module ec11_pcb_traces(single=false, connections=["hole","hole","hole","hole"]) {
  switch_base_pcb_traces(single=single, rgb=false, connections=connections) {
    // Key Row
    if(single){
      translate([2,2.2])
        square([4.5,0.8]);
      r_len = connections[0] != "none" ? u_mm(0.5)-1 : 6;
      l_len = connections[1] != "none" ? u_mm(0.5)-1 : 6;
      translate([2,-r_len])
        square([0.8,r_len+l_len]);
      if(connections[0] != "none")
        translate([-2,1-u_mm(0.5)])
          square([4,0.8]);
      if(connections[1] != "none")
        translate([-2.1,u_mm(0.5)-1.6])
          square([4.9,0.8]);
    }
    translate([7,2.5])
      circle(d=2.5,$fn=40);

    // Key Column
    if(connections[3] != "none")
      translate([1-u_mm(0.5),-6])
        square([u_mm(0.5)-4,1]);
    translate([-3.25,-6])
      square([0.8,5]);
    translate([-3,0])
      circle(d=2.5,$fn=40);

    if(single){
      translate([-3,-3.25])
        circle(d=2.5,$fn=40);
      translate([4.25,-3])
        circle(d=2.5,$fn=40);
    } else {
      translate([-3,-3.25])
        square([7.8,0.8]);
    }

    translate([7,-2.5])
      circle(d=2.5,$fn=40);
    translate([4.25,0]) {
      circle(d=2.5,$fn=40);
      rotate(-45)
        square([5,0.8]);
    }

    translate([4,-6])
      square([0.8,3]);
    if(connections[2] != "none")
      translate([4,-6])
        square([4.5,0.8]);

    if(connections[3] == "hole"){
      translate([-5.5,2.5])
        circle(d=2.25, $fn=20);
      translate([-5.5,0])
        circle(d=2.25, $fn=20);
      translate([-5.5,-2.5])
        circle(d=2.25, $fn=20);
    }
    translate([-7.5,-2.5])
      circle(d=2.25, $fn=20);
    translate([-7.5,2.5])
      circle(d=2.25, $fn=20);
    translate([-7.5,0])
      circle(d=2.25, $fn=20);
  }
}

module ec11_pcb_traces_bottom(connections=["hole","hole","hole","hole"]) {
  switch_base_pcb_traces_bottom(rgb=false, connections=connections) {
    // Key Row
    translate([2,2.2])
      square([4.5,0.8]);
    r_len = connections[0] != "none" ? u_mm(0.5)-1 : 6;
    l_len = connections[1] != "none" ? u_mm(0.5)-1 : 6;
    translate([2,-r_len])
      square([0.8,r_len+l_len]);
    
    if(connections[0] != "none")
      translate([-1.3,1-u_mm(0.5)])
        square([4,0.8]);
    if(connections[1] != "none")
      translate([-1,u_mm(0.5)-1.4])
        square([3.8,0.8]);
    translate([7,2.5])
      circle(d=2.5,$fn=40);

    // Key Column
    translate([-3,0])
      circle(d=2.5,$fn=40);

    translate([7,-2.5])
      circle(d=2.5,$fn=40);
    translate([4.25,0]) {
      circle(d=2.5,$fn=40);
    }

    if(connections[3] == "hole"){
      translate([-5.5,2.5])
        circle(d=2.25, $fn=20);
      translate([-5.5,0])
        circle(d=2.25, $fn=20);
      translate([-5.5,-2.5])
        circle(d=2.25, $fn=20);
    }
    translate([-7.5,-2.5])
      circle(d=2.25, $fn=20);
    translate([-7.5,2.5])
      circle(d=2.25, $fn=20);
    translate([-7.5,0])
      circle(d=2.25, $fn=20);
  }
}

module ec11_pcb_outline() {
  square([u_mm(1), u_mm(1)]);
}

module ec11_space_outline() {
  translate([-0.5,-0.5, -6])
    cube([u_mm(1)+1, u_mm(1)+1, 8]);
  1u_centered() {
    translate([0,0,-15])
      linear_extrude(15)
        circle(d=7, $fn=30);
    translate([0,0,-25])
      linear_extrude(15)
        circle(d=19, $fn=80);
  }
}
// file: ../lib/switches/choc_v1.scad
include <../variables.scad>
include <stabilizers.scad>
include <footprints.scad>

module switch_choc_v1_pcb_drill(width=1, height=1) {
  half_width = u_mm(width)/2;
  half_height = u_mm(height)/2;
  translate([half_width,half_height,0]) {
    circle(d=3.5, $fn=30);

    translate([-5.5,0])
      circle(d=2, $fn=30);
    translate([3,3.8])
      circle(d=1, $fn=30);
    translate([-4, 3.8])
      circle(d=1, $fn=30);
    translate([-4,1.25-half_height])
      circle(d=1, $fn=30);
    translate([-4, half_height-3])
      circle(d=1, $fn=30);

    translate([5.5,0])
      circle(d=2, $fn=30);
    translate([0,5.9])
      circle(d=1.3, $fn=30);
    translate([5,3.8])
      circle(d=1.3, $fn=30);
    translate([1-half_width, half_height-1])
      circle(d=1, $fn=30);
    translate([half_width-1, half_height-1])
      circle(d=1, $fn=30);
  }
}

module switch_choc_v1_pcb_traces(width=1, height=1) {
  half_width = u_mm(width)/2;
  half_height = u_mm(height)/2;
  translate([half_width,half_height,0]) {
    translate([5,3.8])
      circle(d=2.8, $fn=30);
    translate([3,3.8])
      circle(d=2.5, $fn=30);
    translate([-4, 3.8])
      circle(d=2.5, $fn=30);
    translate([-4.5, 2-half_height])
      square([1, u_mm(height)-4]);
    translate([-4,1.25-half_height])
      circle(d=2.5, $fn=30);
    translate([-4, half_height-3])
      circle(d=2.5, $fn=30);

    translate([0,5.9])
      circle(d=2.8, $fn=30);
    translate([-0.5, 5.9])
      square([1, half_height-6.9]);
    translate([1-half_width, half_height-1.5])
      square([half_width*2-2, 1]);
    translate([1-half_width, half_height-1])
      circle(d=2.5, $fn=30);
    translate([half_width-1, half_height-1])
      circle(d=2.5, $fn=30);
  }
}

module switch_choc_v1_pcb_outline(width=1, height=1) {
  pcb_switch_outline(width=width, height=height);
}
// file: ../lib/switches/mx.scad
include <../variables.scad>
include <stabilizers.scad>
include <footprints.scad>
include <base.scad>
include <rgb.scad>

module switch_mx_pcb_drill(width=1, height=1, rgb=true, single=true, connections=["hole","hole","hole","hole"]) {
  half_width = u_mm(width)/2;
  half_height = u_mm(height)/2;
  translate([hole_offset(width), half_height]) {
    stab_holes(width);
  }

  switch_base_pcb_drill(width=width, height=height, single=single, rgb=rgb, connections=connections) {
    circle(d=4,$fn=40);
    translate([-3.8,-2.5,0])
      circle(d=1.7,$fn=40);
    translate([2.5,-5,0])
      circle(d=1.7,$fn=40);
    translate([5,0,0])
      circle(d=1.75,$fn=40);
    translate([-5,0,0])
      circle(d=1.75,$fn=40);

    // Column
    translate([-1.2,-3,0])
      circle(d=1,$fn=40);
    translate([5,-2,0])
      circle(d=1,$fn=40);
    if(single){
      translate([6,-3.7,0])
        circle(d=1,$fn=40);
      if(rgb) {
        translate([5,1.7,0])
          circle(d=1,$fn=40);
      } else {
        translate([6,-8.3,0])
          circle(d=1,$fn=40);
      }
    }
  }
}

module switch_mx_pcb_traces(width=1, height=1, rgb=true, single=true, xpos=0, ypos=0, connections=["hole","hole","hole","hole"], last_xpos=0, last_ypos=0) {
  half_width = u_mm(width)/2;
  half_height = u_mm(height)/2;
  switch_base_pcb_traces(width=width, height=height, rgb=rgb, xpos=xpos, ypos=ypos, connections=connections, last_xpos=last_xpos, last_ypos=last_ypos, single=single) {
    translate([-3.8,-2.5,0])
      circle(d=4,$fn=40);
    translate([2.5,-5,0])
      circle(d=4,$fn=40);

    // Row
    v_left = connections[3] == "none" ? 1 : half_width;
    v_right = connections[2] == "none" ? 1 : half_width-5;
    translate([1-v_left,-5.9,0])
      square([v_left+v_right+3,0.8]);

    // Column
    translate([-1.2,-3,0])
      circle(d=2.5,$fn=40);
    translate([5,-2,0])
      circle(d=2.5,$fn=40);
    if(single){
      translate([6,-3.7,0])
        circle(d=2.5,$fn=40);
      difference() {
        translate([5,0,0])
          circle(d=3.55,$fn=40);
        translate([5,-2,0])
          square(4);
      }
      if(rgb) {
        translate([5,1.7,0])
          circle(d=2.3,$fn=40);
      } else {
        translate([4.2,1])
          square([0.8, half_height-2]);
        translate([-1,half_height-1.5])
          square([6,0.8]);
        translate([6,-8.3,0])
          circle(d=2.5,$fn=40);
        translate([-1.3,-8.7,0])
          square([7,0.8]);
      }
    }
  }
}

module switch_mx_pcb_traces_bottom(width=1, height=1, rgb=true, xpos=0, ypos=0, connections=["hole","hole","hole","hole"], last_xpos=0, last_ypos=0) {
  half_width = u_mm(width)/2;
  half_height = u_mm(height)/2;
  switch_base_pcb_traces_bottom(width=width, height=height, rgb=rgb, xpos=xpos, ypos=ypos, connections=connections, last_xpos=last_xpos, last_ypos=last_ypos) {
    translate([-3.8,-2.5,0])
      circle(d=4,$fn=40);
    translate([2.5,-5,0])
      circle(d=4,$fn=40);

    // Column
    translate([-1.2,-3,0])
      circle(d=2.5,$fn=40);
    translate([5,-2,0])
      circle(d=2.5,$fn=40);
    difference(){
      translate([2.5,-5,0])
        circle(d=5.9,$fn=40);
      translate([2.5,-5,0])
        circle(d=4.1,$fn=40);
      translate([0.3,-7,0])
        rotate(45)
          square(6);
    }
    translate([3.85,-3.45])
      square([0.8, 1]);

    t_height = connections[0] == "none" ? 1 : half_height-7.8;
    echo("h", 2-half_height, t_height);
    translate([-1.3,-t_height-6.8])
      square([0.8, t_height]);
    translate([-1.3,-7.2])
      square([2.2,0.8]);
    difference() {
      translate([5,0,0])
        circle(d=3.35,$fn=40);
      translate([5,-2,0])
        square(4);
    }
    b_height = connections[1] == "none" ? 2 : half_height-2;
    translate([4.2,1])
      square([0.8, b_height]);
    if(connections[1] != "none")
      translate([-1,half_height-1.5])
        square([6,0.8]);
  }
}

module switch_mx_pcb_outline(width=1, height=1) {
  pcb_switch_outline(width=width, height=height);
}
// file: ../lib/utilities.scad
function reverse(list) = len(list) > 0 ? [for (i = [1:len(list)]) list[len(list)-i]] : [];
function pop(list) = len(list) > 0 ? [for (i = [0:len(list)-1]) if (i != 0) list[i]] : [];
// file: ../lib/switches.scad
use <utilities.scad>
include <switches/mx.scad>
include <switches/choc_v1.scad>

module rotate_translate(rotation, xpos, ypos) {
  if(rotation[0] == undef || rotation[0] == 0) {
    translate([u_mm(xpos), u_mm(ypos), 0]) {
      children();
    }
  } else {
    xoff = rotation[1] == undef ? 0 : rotation[1];
    yoff = rotation[2] == undef ? 0 : rotation[2];
    angle = rotation[0] == undef ? 0 : rotation[0];
    translate([u_mm(xpos - xoff), u_mm(ypos - yoff), 0])
      rotate(angle)
        translate([u_mm(xoff), u_mm(yoff), 0])
          children();
  }
}

module switch(type, style="mx", rgb=true, xpos=0, ypos=0, width=1, cnc=false, rotation=[0,0,0], connections=["hole","hole","hole","hole"], last_xpos=0, last_ypos=0) {
  rotate_translate(rotation, xpos, ypos) {
    if(type == "outline")
      pcb_switch_outline(width=width);
    if(style == "mx") {
      if(type == "key")
        pcb_switch_space_outline(width=width, cnc=cnc, style="mx");
      if(type == "traces")
        switch_mx_pcb_traces(width=width, rgb=rgb, xpos=xpos, ypos=ypos, connections=connections, last_xpos=last_xpos, last_ypos=last_ypos);
      if(type == "traces_top")
        switch_mx_pcb_traces(width=width, single=false, rgb=rgb, xpos=xpos, ypos=ypos, connections=connections, last_xpos=last_xpos, last_ypos=last_ypos);
      if(type == "traces_bottom")
        switch_mx_pcb_traces_bottom(width=width, rgb=rgb, xpos=xpos, ypos=ypos, connections=connections, last_xpos=last_xpos, last_ypos=last_ypos);
      if(type == "drill")
        switch_mx_pcb_drill(width=width, rgb=rgb, connections=connections);
      if(type == "drill_double")
        switch_mx_pcb_drill(width=width, single=false, rgb=rgb, connections=connections);
    }

    if(style == "choc_v1") {
      if(type == "key")
        pcb_switch_space_outline(width=width, cnc=cnc, style="choc_v1");
      if(type == "traces")
        switch_choc_v1_pcb_traces(width=width);
      if(type == "traces_top")
        switch_choc_v1_pcb_traces(width=width);
      if(type == "traces_bottom")
        assert(false, "traces_bottom is incompatible with choc_v1");
      if(type == "drill")
        switch_choc_v1_pcb_drill(width=width);
      if(type == "drill_double")
        switch_choc_v1_pcb_drill(width=width, single=false);
    }

    if(style == "redragon") {
      if(type == "key")
        pcb_switch_space_outline(width=width, cnc=cnc, style="redragon");
      if(type == "traces")
        switch_mx_pcb_traces(width=width, rgb=rgb);
      if(type == "traces_top")
        switch_mx_pcb_traces(width=width, single=false, rgb=rgb);
      if(type == "traces_bottom")
        switch_mx_pcb_traces_bottom(width=width, rgb=rgb);
      if(type == "traces")
        switch_mx_pcb_traces(width=width, rgb=rgb);
      if(type == "drill")
        switch_mx_pcb_drill(width=width);
      if(type == "drill_double")
        switch_mx_pcb_drill(width=width, single=false);
    }
  }
}

module switch_row(keys, style="mx", rgb=true, margin=5, thickness=10, depth=0, cnc=false, type="key", last_row=[], last_xpos=0, previous_xpos=0, last_ypos=0, previous_ypos=0) {
  width = keys[0][0] == undef ? 1 : keys[0][0];
  xpos = keys[0][1] == undef ? 0 : keys[0][1];
  ypos = keys[0][2] == undef ? 0 : keys[0][2];
  rotation = keys[0][3] == undef ? [0,0,0] : keys[0][3];
  connections = keys[0][4] == undef ? ["hole","hole","hole","hole"] : keys[0][4];
  last_ypos = last_row[0][2] == undef ? last_ypos - previous_ypos : last_row[0][2]+last_ypos - previous_ypos;
  last_xpos = last_row[0][1] == undef ? last_xpos - previous_xpos : last_row[0][1]+last_xpos - previous_xpos;
  switch(type, style=style, rgb=rgb, xpos=xpos, ypos=ypos, width=width, cnc=cnc, rotation=rotation, connections=connections, last_xpos=last_xpos, last_ypos=last_ypos);
  if(len(keys) > 1) {
    translate([xpos*key_size+width*key_size, ypos*key_size, 0])
      switch_row(pop(keys), style=style, rgb=rgb, margin=margin, thickness=thickness, depth=depth, cnc=cnc, type=type, last_row = pop(last_row), last_xpos=last_xpos, previous_xpos=xpos, last_ypos=last_ypos, previous_ypos=ypos);
  }
}

module switches(switches, style="mx", rgb=true, margin=5, thickness=10, depth=0, cnc=false, type="key", last_row=[]) {
  if(len(switches) != 0) {
    switch_row(switches[0], style=style, rgb=rgb, margin=margin, thickness=thickness, depth=depth, cnc=cnc, type=type, last_row=last_row);
    if(len(switches) > 1) {
      last_row = switches[0];
      translate([0, key_size, 0])
        switches(pop(switches), style=style, rgb=rgb, margin=margin, depth=depth, thickness=thickness, cnc=cnc, type=type, last_row=last_row);
    }
  }
}
// file: ../lib/case.scad
include <variables.scad>
use <utilities.scad>
use <circuits.scad>

function key_width(key) = (key[0] == undef ? 1 : key[0]) + (key[1] == undef ? 0 : key[1]);
function width_row(row) = len(row) == 0 ? 0 : key_width(row[0]) + width_row(pop(row));
function width_board(rows) = len(rows) == 0 ? 0 : (
  let (current = width_row(rows[0]))
  let (next = width_board(pop(rows)))
    current > next ? current : next);

function key_height(key) = (key[2] == undef ? 0 : key[2]);
function height_row(row) = len(row) == 0 ? [0,0] : (
  let(other_rows = height_row(pop(row)))
  let(current = key_height(row[0]) + other_rows[0])
  let(maximum = current > other_rows[1] ? current : other_rows[1])
  [current, maximum]);
function height_board_rec(rows) = len(rows) == 0 ? 0 : (
  let (current = height_row(reverse(rows[0]))[1])
  let (next = height_board_rec(pop(rows)))
    current > next ? current : next);
function height_board(rows) = 
  let (height_rec = height_board_rec(rows))
    len(rows) + (height_rec > 0 ? height_rec : 0);

module case(rows, style="mx", margin=5, thickness=5, depth=0, radius=2, rest=0, circuits=[], _inherit_children="unset") {
  total_thickness = thickness + depth + height_for_style(style);
  z_offset = depth + height_for_style(style);
  if($children != 0 && (_inherit_children == "unset" || _inherit_children > 0)) {
    translate([0, 0, -z_offset])
      linear_extrude(total_thickness)
        offset(margin)
          children();
  } else {
    width=u_mm(width_board(rows))+margin*2;
    height=u_mm(height_board(rows))+margin*2+rest;
    translate([-margin, -margin, -z_offset]){
      translate([radius, 0, 0])
        cube([width-radius*2, height,total_thickness]);
      translate([0, radius, 0])
        cube([width, height-radius*2,total_thickness]);
      translate([radius, radius, 0])
        cylinder(total_thickness,radius,radius, $fn=60);
      translate([width-radius, radius, 0])
        cylinder(total_thickness,radius,radius, $fn=60);
      translate([width-radius, height-radius, 0])
        cylinder(total_thickness,radius,radius, $fn=60);
      translate([radius, height-radius, 0])
        cylinder(total_thickness,radius,radius, $fn=60);
    }
    if(len(circuits) > 0)
      translate([0, 0, -z_offset])
        linear_extrude(total_thickness)
          offset(margin)
            circuits_pcb_outline(circuits);
  }
}
// file: ../lib/variables.scad
key_size=19.05;
hole=14;

function u_mm(u) = u*key_size;
function hole_offset(u) = (key_size-hole)/2+u_mm(u-1)/2;

// This is used to determine how much space is between the top
// of the plate and the PCB.
function height_for_style(style) = style == "mx"        ? 5.334 :
                                   style == "redragon" ? 3.75  :
                                   style == "choc_v1"   ? 2.2   :  "invalid style";
// main file
use <../keyboard.scad>
layout = [[
          [1,0,0,[15,0,-1]],
          [1,0.05,0,[25,0,-1]],
          [1,0.1,0,[35,0,-1]],
          [1,0.2,0,[45,0,-1]]
        ]];
board(layout, depth=5, radius=10)
  translate([-u_mm(0.1),-u_mm(0.3)])
    square([u_mm(5),u_mm(2)]);
